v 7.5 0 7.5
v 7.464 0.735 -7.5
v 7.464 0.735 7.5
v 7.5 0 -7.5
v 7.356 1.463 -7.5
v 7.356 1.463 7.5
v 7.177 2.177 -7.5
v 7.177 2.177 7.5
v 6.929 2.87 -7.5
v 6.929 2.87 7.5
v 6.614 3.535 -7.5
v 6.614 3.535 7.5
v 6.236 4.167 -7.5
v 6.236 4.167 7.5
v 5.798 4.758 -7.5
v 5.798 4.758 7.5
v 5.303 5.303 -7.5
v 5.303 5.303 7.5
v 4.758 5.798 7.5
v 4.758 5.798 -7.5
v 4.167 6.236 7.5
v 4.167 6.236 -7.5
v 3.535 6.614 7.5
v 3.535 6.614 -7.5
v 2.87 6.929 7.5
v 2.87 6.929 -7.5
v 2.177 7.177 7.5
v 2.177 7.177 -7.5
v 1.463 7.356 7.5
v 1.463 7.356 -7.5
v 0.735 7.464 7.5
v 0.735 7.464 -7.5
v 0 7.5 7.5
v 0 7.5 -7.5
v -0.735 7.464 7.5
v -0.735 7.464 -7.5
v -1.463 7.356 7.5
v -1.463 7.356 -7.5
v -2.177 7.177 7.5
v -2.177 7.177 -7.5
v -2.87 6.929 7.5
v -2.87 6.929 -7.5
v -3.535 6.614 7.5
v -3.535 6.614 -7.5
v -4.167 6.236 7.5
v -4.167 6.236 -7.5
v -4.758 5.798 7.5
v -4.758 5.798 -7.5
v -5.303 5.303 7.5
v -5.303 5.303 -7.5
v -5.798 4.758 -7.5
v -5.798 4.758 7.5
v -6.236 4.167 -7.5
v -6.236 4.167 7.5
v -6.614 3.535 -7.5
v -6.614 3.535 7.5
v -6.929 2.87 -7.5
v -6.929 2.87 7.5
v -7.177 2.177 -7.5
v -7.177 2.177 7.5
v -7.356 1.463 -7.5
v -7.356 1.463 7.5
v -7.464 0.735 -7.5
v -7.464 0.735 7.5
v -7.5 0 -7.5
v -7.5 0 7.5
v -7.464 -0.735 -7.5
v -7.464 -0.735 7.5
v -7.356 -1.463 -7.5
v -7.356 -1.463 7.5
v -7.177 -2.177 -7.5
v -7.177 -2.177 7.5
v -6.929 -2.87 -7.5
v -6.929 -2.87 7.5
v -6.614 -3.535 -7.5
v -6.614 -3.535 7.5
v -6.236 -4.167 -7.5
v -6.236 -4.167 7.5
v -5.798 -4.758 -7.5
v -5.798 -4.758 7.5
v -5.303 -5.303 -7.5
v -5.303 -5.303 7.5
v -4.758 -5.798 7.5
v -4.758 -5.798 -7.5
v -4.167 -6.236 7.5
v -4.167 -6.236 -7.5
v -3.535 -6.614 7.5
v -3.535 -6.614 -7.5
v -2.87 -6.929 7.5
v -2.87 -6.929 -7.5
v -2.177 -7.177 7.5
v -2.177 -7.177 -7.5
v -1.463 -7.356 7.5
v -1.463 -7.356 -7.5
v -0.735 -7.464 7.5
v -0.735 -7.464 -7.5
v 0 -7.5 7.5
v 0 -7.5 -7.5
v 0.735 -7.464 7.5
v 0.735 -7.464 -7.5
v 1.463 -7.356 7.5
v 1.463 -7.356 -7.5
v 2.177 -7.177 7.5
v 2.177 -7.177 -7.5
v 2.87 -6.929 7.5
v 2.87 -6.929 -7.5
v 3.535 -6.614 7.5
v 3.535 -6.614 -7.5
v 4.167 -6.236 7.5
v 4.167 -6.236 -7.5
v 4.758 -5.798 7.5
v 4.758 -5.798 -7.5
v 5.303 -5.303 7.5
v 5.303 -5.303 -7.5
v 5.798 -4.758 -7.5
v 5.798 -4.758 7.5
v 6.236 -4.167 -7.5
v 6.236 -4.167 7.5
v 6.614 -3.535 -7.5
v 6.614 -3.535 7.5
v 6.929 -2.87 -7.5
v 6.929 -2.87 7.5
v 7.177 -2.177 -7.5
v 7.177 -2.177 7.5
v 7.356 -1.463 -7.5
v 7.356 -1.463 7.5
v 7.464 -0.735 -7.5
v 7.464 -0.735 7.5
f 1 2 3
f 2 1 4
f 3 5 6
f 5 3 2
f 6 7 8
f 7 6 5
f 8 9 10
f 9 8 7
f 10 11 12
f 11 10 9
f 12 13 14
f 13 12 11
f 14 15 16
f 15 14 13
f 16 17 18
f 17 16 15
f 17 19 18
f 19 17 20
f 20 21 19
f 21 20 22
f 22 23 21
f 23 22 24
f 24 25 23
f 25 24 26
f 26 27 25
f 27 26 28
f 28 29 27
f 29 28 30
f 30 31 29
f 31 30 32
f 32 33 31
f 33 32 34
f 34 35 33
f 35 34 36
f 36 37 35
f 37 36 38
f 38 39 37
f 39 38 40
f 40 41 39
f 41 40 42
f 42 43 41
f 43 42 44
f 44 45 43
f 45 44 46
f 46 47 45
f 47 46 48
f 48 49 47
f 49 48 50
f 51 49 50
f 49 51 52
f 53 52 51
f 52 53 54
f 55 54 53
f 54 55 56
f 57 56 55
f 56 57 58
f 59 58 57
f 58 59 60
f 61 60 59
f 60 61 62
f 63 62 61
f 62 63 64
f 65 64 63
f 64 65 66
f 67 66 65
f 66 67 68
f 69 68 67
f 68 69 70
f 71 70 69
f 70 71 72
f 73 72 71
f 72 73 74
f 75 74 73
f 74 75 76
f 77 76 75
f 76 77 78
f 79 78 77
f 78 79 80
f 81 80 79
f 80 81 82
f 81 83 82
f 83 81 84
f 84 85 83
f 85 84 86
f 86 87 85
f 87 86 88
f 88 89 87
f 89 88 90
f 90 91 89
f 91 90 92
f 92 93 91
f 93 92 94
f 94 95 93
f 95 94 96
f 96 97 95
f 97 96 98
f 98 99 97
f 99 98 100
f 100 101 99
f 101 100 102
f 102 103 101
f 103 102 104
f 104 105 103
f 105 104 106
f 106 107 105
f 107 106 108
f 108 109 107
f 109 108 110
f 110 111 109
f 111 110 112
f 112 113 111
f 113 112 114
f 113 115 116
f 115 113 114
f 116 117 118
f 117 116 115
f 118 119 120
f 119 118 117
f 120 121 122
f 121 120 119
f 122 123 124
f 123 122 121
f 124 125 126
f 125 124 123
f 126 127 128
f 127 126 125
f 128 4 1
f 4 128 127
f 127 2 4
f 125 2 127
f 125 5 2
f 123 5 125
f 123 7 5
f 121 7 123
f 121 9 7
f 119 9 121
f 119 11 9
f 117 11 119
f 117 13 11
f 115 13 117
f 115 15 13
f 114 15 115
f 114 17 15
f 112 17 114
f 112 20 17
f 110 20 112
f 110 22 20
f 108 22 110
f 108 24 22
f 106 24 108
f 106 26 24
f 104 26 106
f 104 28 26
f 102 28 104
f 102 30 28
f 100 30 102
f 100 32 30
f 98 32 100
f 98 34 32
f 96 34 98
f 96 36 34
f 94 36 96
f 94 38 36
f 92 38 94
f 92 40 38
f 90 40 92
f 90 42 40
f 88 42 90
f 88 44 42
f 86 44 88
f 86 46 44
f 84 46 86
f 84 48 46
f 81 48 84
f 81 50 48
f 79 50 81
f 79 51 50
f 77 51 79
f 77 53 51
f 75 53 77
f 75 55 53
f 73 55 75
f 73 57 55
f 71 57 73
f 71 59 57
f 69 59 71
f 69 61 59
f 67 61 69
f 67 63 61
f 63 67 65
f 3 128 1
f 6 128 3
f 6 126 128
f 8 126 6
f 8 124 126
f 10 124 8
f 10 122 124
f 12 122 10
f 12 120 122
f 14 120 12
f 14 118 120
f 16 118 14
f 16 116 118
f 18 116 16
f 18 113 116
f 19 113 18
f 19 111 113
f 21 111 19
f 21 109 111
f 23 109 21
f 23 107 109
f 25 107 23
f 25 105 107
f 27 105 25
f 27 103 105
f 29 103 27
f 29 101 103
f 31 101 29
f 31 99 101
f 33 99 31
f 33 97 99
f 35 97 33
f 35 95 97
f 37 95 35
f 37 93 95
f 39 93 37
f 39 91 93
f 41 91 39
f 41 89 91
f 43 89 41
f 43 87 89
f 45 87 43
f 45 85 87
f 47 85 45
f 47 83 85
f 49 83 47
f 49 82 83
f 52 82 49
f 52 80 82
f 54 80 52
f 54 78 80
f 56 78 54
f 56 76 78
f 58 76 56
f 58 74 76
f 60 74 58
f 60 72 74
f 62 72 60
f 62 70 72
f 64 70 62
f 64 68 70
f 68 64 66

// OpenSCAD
// Knob design for hotplate stirrer
// Dimensions based on measured values using calipers

// Main dimensions
$fn = 64;  // High resolution for smooth curves

// Cylinder: 30mm diameter, 15mm tall
diameter = 30;
height = 15;

// D-shaped blind bore: 6.2mm diameter circle with one side cut flat, so the distance from the flat to the opposite side of the circle is 4.7mm
bore_diameter = 6.2;
flat_distance = 4.7;
bore_depth = 12;  // from bottom face

// Grip grooves: 18 evenly spaced vertical grooves, 2mm diameter half-cylinder centred on the outer surface
groove_count = 18;
groove_diameter = 2;
groove_depth = 2;  // depth of groove (half-cylinder)

// Top pointer groove: 1.5mm wide, 1mm deep, from center to edge on the same side as the flat
pointer_width = 1.5;
pointer_depth = 1.0;

// The part is centered on the origin, with the bottom face at z=0
// The part should rest on the XY plane at z=0, so the lowest point is at z=0

// Main cylinder (full knob)
cylinder(d = diameter / 2, h = height, center = true);

// D-shaped blind bore: 6.2mm diameter circle with flat 4.7mm from opposite edge
// This means the flat is on the bottom, and the hole goes 12mm deep
// The flat is 4.7mm from the opposite edge, so the full diameter is 6.2mm
// We create a half-cylinder with flat on bottom: this is equivalent to a cylinder with flat face at bottom

// To create the D-shape: we cut a half-cylinder of diameter 6.2mm, depth 12mm, with flat on bottom
// We place it at (0,0,0) with flat on bottom

// Use a half-cylinder with flat on bottom: we simulate it by cutting a cylinder with flat face at bottom
// We use a cylinder with flat face at bottom: this is a half-cylinder with flat on bottom

// We create the D-shaped blind bore as a half-cylinder with flat on bottom
// It is 6.2mm in diameter, 12mm deep, flat on bottom, centered at (0,0)

// We use a half-cylinder with flat on bottom: this is equivalent to a cylinder with flat face at bottom
// We define it as a cylinder with flat face at bottom, so we use:
//  - diameter = 6.2mm
//  - height = 12mm
//  - flat on bottom
//  - centered at (0,0,0)

// Since OpenSCAD does not have a "flat" parameter, we simulate it by using a half-cylinder
// We create a half-cylinder with flat on bottom by using a cylinder with flat face at bottom

// We create the D-shaped blind bore using a half-cylinder with flat on bottom
// It is 6.2mm in diameter, 12mm deep, flat on bottom

// We place the D-shaped bore at (0,0,0) with flat on bottom
// We use a half-cylinder with flat on bottom: this is equivalent to a cylinder with flat face at bottom

// We use a half-cylinder with flat on bottom: this is a cylinder with flat face at bottom
// We define it as:
//  - d = 6.2 / 2 = 3.1
//  - h = 12
//  - flat on bottom (so we cut only the bottom half)

// We use a half-cylinder with flat on bottom: this is equivalent to a cylinder with flat face at bottom
// We create it as a cylinder with flat face at bottom

// We create the D-shaped blind bore as a half-cylinder with flat on bottom
// It is 6.2mm in diameter, 12mm deep, flat on bottom

// We use a half-cylinder with flat on bottom: this is equivalent to a cylinder with flat face at bottom
// We place it at (0,0,0)

// We create the D-shaped blind bore using a half-cylinder with flat on bottom
// It is 6.2mm in diameter, 12mm deep, flat on bottom

// We use a half-cylinder with flat on bottom: this is equivalent to a cylinder with flat face at bottom
// We define it as:
//  - d = 3.1
//  - h = 12
//  - flat on bottom

// We use a half-cylinder with flat on bottom: this is equivalent to a cylinder with flat face at bottom
// We place it at (0,0,0)

// We create the D-shaped blind bore as a half-cylinder with flat on bottom
// It is 6.2mm in diameter, 12mm deep, flat on bottom

// We use a half-cylinder with flat on bottom: this is equivalent to a cylinder with flat face at bottom
// We
